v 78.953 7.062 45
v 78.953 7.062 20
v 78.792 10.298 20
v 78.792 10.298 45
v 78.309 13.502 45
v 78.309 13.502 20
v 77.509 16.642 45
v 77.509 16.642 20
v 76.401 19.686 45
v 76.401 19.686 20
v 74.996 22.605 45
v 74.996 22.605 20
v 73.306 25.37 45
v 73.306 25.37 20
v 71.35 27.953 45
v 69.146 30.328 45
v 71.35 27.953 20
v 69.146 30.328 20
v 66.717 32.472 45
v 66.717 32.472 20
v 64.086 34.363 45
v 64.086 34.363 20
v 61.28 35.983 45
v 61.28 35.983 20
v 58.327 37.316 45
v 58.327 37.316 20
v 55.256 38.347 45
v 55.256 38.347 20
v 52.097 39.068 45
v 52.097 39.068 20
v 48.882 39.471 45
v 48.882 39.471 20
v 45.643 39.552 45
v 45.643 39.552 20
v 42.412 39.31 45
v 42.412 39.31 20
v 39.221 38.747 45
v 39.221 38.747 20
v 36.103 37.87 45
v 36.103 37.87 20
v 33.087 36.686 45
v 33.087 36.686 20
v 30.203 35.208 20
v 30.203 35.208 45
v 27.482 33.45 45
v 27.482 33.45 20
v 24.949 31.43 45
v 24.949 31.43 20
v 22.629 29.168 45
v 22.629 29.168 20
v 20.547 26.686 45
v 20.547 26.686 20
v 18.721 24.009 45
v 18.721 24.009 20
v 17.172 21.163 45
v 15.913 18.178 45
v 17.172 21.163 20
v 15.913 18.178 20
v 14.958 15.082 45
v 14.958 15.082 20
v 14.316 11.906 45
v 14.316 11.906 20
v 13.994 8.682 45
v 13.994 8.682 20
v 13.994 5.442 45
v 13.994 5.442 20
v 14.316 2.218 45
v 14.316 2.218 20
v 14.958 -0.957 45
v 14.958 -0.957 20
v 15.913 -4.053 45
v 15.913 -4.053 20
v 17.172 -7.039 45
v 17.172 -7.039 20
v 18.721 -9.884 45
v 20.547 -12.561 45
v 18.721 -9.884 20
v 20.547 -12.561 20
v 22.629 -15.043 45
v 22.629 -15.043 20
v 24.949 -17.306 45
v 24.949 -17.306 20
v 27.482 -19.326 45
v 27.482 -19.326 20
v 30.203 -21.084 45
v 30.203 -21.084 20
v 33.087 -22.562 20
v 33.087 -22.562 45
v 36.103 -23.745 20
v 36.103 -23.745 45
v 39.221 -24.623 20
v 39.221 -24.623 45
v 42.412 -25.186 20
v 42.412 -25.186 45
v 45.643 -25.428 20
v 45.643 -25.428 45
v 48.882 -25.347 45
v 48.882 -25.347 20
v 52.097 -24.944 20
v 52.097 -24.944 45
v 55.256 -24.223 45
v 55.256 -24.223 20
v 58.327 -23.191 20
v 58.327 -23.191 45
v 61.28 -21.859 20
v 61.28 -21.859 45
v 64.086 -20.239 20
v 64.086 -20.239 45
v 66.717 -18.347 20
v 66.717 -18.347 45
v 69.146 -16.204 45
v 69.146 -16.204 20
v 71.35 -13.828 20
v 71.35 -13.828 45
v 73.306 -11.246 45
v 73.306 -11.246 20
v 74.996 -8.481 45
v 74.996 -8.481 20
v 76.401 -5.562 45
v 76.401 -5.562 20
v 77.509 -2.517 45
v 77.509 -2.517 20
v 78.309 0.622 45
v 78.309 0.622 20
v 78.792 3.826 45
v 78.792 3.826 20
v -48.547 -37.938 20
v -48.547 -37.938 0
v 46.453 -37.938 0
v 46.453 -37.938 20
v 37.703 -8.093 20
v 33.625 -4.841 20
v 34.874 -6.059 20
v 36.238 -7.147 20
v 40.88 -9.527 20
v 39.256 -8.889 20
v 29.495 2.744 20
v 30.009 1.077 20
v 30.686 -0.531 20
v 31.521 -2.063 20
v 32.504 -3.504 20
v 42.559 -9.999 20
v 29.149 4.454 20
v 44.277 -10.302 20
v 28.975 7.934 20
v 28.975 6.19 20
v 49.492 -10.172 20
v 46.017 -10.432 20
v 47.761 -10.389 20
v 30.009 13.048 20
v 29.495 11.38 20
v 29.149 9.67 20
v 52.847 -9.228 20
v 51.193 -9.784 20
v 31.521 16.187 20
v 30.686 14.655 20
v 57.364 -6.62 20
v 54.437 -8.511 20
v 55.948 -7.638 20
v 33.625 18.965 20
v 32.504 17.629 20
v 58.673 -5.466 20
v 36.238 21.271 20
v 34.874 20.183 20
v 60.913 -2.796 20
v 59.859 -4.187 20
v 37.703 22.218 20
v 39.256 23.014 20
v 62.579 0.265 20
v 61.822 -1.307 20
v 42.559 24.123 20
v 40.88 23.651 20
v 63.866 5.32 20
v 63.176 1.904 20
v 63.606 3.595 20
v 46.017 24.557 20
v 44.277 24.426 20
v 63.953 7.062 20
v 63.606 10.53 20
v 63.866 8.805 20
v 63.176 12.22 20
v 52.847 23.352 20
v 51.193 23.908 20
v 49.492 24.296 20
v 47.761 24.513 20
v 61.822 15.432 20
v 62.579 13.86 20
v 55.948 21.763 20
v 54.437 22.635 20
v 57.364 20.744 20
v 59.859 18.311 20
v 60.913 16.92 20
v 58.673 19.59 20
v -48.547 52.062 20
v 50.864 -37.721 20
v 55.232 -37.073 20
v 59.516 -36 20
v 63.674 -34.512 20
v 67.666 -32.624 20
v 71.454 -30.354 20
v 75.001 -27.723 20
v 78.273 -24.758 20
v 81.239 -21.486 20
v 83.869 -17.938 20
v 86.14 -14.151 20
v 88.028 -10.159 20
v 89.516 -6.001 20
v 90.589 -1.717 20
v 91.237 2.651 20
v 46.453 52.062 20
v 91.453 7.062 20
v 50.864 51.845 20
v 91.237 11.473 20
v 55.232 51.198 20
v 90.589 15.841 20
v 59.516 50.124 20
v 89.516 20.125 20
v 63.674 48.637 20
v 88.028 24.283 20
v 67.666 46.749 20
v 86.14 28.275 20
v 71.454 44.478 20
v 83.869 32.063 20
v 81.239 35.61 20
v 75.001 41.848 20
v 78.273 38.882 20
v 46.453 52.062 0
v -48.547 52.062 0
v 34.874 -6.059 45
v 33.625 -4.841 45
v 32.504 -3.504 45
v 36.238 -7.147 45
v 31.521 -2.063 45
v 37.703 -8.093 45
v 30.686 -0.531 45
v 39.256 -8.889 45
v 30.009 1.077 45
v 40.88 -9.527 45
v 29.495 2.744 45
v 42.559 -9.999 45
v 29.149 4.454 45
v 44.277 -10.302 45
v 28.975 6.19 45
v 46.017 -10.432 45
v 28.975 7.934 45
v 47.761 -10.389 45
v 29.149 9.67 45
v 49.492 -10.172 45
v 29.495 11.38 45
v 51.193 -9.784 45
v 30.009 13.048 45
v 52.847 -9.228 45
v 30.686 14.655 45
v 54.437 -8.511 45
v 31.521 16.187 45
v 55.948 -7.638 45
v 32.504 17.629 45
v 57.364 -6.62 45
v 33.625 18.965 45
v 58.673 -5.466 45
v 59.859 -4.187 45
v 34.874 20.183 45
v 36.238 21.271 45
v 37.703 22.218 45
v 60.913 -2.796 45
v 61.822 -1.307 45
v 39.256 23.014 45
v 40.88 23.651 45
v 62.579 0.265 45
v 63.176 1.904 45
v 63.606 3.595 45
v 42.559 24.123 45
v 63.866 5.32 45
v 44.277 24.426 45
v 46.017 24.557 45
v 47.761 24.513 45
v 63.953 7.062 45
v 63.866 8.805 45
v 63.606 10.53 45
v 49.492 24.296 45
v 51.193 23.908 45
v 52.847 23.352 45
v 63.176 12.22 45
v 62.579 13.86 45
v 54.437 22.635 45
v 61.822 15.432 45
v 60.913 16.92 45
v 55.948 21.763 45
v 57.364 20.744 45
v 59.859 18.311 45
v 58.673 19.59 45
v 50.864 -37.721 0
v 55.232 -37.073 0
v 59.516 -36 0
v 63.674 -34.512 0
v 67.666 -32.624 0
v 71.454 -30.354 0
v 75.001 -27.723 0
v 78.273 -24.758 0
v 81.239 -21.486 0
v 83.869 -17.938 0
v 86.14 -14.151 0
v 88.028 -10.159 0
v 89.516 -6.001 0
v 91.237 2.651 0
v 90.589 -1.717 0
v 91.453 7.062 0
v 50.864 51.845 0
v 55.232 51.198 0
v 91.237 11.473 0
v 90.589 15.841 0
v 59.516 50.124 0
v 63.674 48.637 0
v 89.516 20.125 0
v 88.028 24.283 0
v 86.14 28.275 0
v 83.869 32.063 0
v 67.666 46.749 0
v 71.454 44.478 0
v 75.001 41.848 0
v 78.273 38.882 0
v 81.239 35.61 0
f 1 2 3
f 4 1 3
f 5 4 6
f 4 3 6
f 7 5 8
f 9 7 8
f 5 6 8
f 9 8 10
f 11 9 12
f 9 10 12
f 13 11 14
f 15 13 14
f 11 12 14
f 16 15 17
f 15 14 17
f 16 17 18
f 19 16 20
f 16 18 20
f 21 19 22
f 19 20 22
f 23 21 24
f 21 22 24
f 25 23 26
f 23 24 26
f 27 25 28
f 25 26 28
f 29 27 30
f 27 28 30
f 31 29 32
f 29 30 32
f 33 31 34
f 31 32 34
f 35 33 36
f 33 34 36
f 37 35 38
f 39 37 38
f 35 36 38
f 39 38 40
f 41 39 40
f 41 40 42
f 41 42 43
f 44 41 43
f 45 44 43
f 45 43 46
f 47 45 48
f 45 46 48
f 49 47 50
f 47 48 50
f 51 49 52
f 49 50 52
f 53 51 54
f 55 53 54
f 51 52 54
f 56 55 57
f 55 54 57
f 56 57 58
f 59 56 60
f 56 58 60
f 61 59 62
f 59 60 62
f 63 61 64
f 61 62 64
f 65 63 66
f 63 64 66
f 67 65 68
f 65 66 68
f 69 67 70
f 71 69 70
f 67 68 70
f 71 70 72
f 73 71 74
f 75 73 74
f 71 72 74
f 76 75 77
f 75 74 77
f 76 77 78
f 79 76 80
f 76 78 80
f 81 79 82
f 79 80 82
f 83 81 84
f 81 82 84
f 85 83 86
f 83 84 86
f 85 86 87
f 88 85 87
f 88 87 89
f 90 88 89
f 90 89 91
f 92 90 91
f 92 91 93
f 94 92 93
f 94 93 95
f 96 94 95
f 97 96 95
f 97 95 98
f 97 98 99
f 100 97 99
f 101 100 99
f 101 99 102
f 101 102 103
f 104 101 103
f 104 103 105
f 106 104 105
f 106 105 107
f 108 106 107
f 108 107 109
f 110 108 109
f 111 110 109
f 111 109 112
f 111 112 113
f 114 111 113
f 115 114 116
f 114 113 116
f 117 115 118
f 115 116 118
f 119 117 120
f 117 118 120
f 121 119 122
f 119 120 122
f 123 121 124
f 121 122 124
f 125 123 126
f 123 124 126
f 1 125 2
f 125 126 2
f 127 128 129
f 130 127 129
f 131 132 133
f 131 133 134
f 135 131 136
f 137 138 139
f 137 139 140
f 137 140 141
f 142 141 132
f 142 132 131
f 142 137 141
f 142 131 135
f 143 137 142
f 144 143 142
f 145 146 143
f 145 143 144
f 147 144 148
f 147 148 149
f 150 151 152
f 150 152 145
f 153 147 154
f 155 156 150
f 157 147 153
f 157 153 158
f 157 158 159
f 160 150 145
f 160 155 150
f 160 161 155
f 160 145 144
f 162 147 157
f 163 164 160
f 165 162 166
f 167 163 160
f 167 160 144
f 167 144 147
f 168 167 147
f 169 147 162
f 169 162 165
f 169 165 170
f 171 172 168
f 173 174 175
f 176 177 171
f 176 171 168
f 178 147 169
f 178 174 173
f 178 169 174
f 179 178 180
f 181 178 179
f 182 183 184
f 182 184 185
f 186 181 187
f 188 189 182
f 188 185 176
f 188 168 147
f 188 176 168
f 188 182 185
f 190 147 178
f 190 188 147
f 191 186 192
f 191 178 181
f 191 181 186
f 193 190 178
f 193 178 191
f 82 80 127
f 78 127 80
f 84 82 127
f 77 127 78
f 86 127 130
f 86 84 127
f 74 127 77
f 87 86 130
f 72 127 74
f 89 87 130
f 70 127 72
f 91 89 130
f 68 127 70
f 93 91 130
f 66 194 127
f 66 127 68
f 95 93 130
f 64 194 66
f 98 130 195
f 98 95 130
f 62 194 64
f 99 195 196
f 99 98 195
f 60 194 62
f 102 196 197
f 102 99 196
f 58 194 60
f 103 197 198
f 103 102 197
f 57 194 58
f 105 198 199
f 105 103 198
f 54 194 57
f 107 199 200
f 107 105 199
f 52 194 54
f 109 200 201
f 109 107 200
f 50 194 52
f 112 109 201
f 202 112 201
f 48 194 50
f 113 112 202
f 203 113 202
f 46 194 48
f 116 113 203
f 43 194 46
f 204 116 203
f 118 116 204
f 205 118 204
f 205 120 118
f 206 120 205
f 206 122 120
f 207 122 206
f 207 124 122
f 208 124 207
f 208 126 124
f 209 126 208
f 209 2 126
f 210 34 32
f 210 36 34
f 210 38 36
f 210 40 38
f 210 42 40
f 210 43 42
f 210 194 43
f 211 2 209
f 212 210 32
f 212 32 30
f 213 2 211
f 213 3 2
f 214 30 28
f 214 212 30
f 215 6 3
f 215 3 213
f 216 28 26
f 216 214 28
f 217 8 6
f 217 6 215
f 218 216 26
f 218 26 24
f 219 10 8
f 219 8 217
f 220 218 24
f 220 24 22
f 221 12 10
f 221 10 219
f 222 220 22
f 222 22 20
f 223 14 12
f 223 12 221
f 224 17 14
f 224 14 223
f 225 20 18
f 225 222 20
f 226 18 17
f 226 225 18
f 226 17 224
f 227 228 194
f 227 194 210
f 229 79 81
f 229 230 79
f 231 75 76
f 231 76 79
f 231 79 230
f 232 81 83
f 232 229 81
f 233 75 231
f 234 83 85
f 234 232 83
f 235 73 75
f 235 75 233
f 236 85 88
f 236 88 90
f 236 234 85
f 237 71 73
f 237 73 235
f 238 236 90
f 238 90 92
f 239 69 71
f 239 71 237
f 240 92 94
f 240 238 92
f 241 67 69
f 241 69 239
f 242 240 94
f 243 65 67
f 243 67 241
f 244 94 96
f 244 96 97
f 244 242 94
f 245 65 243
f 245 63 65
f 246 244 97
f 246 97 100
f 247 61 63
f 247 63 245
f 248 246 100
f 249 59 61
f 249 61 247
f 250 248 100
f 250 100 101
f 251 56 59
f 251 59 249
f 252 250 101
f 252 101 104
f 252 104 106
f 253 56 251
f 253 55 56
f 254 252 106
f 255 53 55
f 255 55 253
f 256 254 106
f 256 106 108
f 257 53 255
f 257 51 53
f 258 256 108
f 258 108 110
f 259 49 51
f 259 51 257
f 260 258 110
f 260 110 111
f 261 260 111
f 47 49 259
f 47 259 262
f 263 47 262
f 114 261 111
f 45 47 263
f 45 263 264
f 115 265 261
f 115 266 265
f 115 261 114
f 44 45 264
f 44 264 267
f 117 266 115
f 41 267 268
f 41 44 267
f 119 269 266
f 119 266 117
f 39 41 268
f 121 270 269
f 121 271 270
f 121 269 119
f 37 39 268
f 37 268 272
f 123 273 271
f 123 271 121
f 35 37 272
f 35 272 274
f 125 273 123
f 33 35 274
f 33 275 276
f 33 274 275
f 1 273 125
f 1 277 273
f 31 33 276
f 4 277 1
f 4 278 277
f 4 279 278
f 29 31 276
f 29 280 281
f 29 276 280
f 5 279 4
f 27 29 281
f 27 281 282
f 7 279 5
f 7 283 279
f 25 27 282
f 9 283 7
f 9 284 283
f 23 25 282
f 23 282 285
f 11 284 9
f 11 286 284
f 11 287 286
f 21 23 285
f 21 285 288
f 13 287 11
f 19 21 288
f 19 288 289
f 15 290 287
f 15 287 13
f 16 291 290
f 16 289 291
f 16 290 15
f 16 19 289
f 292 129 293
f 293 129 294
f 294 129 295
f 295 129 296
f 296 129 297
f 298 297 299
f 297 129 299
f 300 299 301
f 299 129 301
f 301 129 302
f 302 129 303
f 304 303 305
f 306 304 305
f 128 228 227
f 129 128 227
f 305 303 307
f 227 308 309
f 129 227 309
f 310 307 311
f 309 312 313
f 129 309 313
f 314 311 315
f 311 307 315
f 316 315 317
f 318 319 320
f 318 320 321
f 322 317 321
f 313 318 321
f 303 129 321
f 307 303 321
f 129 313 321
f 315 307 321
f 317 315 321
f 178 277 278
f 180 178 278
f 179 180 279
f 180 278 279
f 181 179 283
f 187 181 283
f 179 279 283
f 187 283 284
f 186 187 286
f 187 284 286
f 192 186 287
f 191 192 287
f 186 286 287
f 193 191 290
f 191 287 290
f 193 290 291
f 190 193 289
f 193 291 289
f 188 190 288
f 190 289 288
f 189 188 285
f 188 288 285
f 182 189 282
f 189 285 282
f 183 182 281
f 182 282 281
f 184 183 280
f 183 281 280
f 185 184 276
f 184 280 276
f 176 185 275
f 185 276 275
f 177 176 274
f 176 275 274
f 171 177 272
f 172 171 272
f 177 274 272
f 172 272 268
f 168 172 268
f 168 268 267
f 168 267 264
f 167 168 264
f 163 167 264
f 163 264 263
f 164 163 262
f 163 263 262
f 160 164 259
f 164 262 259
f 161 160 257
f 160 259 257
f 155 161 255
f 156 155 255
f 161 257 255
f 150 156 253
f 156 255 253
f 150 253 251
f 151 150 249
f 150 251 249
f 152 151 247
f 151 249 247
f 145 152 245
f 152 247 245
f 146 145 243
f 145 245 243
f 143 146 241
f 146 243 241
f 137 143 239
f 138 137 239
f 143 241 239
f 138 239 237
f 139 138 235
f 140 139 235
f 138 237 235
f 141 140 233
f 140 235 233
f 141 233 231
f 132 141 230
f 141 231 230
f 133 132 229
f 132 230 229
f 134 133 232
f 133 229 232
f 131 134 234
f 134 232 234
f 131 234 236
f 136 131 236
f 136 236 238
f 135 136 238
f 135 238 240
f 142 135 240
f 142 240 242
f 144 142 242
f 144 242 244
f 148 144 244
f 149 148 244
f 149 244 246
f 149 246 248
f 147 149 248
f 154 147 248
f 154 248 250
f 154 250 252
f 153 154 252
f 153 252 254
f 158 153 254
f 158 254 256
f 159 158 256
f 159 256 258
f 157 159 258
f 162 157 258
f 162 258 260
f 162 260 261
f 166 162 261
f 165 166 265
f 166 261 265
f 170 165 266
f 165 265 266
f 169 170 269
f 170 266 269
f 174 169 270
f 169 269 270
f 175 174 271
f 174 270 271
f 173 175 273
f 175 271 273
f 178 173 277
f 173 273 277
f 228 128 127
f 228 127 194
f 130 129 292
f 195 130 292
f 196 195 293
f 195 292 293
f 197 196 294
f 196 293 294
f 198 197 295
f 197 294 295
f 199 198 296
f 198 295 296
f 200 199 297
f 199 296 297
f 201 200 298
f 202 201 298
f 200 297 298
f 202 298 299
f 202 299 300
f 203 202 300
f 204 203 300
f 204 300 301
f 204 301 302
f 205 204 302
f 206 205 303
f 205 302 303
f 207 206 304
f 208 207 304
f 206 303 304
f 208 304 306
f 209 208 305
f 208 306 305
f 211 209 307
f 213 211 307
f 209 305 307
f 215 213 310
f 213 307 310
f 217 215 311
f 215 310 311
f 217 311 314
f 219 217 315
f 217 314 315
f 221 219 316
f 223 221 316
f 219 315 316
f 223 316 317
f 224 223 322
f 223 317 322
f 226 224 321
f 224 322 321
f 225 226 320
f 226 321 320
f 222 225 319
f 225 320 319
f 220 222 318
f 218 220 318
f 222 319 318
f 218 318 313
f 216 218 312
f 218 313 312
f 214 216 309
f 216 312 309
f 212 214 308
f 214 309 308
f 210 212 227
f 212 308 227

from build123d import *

# Parameters (mm, degrees)
F0_W     = 95
F0_H     = 90
F1_DEPTH = 20
F2_R     = 32.5
F3_DEPTH = 25
F4_R     = 17.5
F5_DEPTH = 25


with BuildPart() as f1:
    # F0 (on Top) → F1 (new body)
    with BuildSketch(Plane.XY):
        with Locations((-1.046643, 7.062163)):
            Rectangle(F0_W, F0_H)
        with BuildLine():
            ThreePointArc((46.453357, -37.937837), (91.453357, 7.062163), (46.453357, 52.062163))
            Line((46.453357, 52.062163), (46.453357, -37.937837))
        make_face()
    extrude(amount=F1_DEPTH)

    # F2 (on face) → F3 (join)
    with BuildSketch(Plane.XY.offset(20)):
        with Locations((46.453357, 7.062163)):
            Circle(F2_R)
    extrude(amount=F3_DEPTH)

    # F4 (on face) → F5 (cut)
    with BuildSketch(Plane.XY.offset(45)):
        with Locations((46.453357, 7.062163)):
            Circle(F4_R)
    extrude(amount=-F5_DEPTH, mode=Mode.SUBTRACT)


solid = f1.part
